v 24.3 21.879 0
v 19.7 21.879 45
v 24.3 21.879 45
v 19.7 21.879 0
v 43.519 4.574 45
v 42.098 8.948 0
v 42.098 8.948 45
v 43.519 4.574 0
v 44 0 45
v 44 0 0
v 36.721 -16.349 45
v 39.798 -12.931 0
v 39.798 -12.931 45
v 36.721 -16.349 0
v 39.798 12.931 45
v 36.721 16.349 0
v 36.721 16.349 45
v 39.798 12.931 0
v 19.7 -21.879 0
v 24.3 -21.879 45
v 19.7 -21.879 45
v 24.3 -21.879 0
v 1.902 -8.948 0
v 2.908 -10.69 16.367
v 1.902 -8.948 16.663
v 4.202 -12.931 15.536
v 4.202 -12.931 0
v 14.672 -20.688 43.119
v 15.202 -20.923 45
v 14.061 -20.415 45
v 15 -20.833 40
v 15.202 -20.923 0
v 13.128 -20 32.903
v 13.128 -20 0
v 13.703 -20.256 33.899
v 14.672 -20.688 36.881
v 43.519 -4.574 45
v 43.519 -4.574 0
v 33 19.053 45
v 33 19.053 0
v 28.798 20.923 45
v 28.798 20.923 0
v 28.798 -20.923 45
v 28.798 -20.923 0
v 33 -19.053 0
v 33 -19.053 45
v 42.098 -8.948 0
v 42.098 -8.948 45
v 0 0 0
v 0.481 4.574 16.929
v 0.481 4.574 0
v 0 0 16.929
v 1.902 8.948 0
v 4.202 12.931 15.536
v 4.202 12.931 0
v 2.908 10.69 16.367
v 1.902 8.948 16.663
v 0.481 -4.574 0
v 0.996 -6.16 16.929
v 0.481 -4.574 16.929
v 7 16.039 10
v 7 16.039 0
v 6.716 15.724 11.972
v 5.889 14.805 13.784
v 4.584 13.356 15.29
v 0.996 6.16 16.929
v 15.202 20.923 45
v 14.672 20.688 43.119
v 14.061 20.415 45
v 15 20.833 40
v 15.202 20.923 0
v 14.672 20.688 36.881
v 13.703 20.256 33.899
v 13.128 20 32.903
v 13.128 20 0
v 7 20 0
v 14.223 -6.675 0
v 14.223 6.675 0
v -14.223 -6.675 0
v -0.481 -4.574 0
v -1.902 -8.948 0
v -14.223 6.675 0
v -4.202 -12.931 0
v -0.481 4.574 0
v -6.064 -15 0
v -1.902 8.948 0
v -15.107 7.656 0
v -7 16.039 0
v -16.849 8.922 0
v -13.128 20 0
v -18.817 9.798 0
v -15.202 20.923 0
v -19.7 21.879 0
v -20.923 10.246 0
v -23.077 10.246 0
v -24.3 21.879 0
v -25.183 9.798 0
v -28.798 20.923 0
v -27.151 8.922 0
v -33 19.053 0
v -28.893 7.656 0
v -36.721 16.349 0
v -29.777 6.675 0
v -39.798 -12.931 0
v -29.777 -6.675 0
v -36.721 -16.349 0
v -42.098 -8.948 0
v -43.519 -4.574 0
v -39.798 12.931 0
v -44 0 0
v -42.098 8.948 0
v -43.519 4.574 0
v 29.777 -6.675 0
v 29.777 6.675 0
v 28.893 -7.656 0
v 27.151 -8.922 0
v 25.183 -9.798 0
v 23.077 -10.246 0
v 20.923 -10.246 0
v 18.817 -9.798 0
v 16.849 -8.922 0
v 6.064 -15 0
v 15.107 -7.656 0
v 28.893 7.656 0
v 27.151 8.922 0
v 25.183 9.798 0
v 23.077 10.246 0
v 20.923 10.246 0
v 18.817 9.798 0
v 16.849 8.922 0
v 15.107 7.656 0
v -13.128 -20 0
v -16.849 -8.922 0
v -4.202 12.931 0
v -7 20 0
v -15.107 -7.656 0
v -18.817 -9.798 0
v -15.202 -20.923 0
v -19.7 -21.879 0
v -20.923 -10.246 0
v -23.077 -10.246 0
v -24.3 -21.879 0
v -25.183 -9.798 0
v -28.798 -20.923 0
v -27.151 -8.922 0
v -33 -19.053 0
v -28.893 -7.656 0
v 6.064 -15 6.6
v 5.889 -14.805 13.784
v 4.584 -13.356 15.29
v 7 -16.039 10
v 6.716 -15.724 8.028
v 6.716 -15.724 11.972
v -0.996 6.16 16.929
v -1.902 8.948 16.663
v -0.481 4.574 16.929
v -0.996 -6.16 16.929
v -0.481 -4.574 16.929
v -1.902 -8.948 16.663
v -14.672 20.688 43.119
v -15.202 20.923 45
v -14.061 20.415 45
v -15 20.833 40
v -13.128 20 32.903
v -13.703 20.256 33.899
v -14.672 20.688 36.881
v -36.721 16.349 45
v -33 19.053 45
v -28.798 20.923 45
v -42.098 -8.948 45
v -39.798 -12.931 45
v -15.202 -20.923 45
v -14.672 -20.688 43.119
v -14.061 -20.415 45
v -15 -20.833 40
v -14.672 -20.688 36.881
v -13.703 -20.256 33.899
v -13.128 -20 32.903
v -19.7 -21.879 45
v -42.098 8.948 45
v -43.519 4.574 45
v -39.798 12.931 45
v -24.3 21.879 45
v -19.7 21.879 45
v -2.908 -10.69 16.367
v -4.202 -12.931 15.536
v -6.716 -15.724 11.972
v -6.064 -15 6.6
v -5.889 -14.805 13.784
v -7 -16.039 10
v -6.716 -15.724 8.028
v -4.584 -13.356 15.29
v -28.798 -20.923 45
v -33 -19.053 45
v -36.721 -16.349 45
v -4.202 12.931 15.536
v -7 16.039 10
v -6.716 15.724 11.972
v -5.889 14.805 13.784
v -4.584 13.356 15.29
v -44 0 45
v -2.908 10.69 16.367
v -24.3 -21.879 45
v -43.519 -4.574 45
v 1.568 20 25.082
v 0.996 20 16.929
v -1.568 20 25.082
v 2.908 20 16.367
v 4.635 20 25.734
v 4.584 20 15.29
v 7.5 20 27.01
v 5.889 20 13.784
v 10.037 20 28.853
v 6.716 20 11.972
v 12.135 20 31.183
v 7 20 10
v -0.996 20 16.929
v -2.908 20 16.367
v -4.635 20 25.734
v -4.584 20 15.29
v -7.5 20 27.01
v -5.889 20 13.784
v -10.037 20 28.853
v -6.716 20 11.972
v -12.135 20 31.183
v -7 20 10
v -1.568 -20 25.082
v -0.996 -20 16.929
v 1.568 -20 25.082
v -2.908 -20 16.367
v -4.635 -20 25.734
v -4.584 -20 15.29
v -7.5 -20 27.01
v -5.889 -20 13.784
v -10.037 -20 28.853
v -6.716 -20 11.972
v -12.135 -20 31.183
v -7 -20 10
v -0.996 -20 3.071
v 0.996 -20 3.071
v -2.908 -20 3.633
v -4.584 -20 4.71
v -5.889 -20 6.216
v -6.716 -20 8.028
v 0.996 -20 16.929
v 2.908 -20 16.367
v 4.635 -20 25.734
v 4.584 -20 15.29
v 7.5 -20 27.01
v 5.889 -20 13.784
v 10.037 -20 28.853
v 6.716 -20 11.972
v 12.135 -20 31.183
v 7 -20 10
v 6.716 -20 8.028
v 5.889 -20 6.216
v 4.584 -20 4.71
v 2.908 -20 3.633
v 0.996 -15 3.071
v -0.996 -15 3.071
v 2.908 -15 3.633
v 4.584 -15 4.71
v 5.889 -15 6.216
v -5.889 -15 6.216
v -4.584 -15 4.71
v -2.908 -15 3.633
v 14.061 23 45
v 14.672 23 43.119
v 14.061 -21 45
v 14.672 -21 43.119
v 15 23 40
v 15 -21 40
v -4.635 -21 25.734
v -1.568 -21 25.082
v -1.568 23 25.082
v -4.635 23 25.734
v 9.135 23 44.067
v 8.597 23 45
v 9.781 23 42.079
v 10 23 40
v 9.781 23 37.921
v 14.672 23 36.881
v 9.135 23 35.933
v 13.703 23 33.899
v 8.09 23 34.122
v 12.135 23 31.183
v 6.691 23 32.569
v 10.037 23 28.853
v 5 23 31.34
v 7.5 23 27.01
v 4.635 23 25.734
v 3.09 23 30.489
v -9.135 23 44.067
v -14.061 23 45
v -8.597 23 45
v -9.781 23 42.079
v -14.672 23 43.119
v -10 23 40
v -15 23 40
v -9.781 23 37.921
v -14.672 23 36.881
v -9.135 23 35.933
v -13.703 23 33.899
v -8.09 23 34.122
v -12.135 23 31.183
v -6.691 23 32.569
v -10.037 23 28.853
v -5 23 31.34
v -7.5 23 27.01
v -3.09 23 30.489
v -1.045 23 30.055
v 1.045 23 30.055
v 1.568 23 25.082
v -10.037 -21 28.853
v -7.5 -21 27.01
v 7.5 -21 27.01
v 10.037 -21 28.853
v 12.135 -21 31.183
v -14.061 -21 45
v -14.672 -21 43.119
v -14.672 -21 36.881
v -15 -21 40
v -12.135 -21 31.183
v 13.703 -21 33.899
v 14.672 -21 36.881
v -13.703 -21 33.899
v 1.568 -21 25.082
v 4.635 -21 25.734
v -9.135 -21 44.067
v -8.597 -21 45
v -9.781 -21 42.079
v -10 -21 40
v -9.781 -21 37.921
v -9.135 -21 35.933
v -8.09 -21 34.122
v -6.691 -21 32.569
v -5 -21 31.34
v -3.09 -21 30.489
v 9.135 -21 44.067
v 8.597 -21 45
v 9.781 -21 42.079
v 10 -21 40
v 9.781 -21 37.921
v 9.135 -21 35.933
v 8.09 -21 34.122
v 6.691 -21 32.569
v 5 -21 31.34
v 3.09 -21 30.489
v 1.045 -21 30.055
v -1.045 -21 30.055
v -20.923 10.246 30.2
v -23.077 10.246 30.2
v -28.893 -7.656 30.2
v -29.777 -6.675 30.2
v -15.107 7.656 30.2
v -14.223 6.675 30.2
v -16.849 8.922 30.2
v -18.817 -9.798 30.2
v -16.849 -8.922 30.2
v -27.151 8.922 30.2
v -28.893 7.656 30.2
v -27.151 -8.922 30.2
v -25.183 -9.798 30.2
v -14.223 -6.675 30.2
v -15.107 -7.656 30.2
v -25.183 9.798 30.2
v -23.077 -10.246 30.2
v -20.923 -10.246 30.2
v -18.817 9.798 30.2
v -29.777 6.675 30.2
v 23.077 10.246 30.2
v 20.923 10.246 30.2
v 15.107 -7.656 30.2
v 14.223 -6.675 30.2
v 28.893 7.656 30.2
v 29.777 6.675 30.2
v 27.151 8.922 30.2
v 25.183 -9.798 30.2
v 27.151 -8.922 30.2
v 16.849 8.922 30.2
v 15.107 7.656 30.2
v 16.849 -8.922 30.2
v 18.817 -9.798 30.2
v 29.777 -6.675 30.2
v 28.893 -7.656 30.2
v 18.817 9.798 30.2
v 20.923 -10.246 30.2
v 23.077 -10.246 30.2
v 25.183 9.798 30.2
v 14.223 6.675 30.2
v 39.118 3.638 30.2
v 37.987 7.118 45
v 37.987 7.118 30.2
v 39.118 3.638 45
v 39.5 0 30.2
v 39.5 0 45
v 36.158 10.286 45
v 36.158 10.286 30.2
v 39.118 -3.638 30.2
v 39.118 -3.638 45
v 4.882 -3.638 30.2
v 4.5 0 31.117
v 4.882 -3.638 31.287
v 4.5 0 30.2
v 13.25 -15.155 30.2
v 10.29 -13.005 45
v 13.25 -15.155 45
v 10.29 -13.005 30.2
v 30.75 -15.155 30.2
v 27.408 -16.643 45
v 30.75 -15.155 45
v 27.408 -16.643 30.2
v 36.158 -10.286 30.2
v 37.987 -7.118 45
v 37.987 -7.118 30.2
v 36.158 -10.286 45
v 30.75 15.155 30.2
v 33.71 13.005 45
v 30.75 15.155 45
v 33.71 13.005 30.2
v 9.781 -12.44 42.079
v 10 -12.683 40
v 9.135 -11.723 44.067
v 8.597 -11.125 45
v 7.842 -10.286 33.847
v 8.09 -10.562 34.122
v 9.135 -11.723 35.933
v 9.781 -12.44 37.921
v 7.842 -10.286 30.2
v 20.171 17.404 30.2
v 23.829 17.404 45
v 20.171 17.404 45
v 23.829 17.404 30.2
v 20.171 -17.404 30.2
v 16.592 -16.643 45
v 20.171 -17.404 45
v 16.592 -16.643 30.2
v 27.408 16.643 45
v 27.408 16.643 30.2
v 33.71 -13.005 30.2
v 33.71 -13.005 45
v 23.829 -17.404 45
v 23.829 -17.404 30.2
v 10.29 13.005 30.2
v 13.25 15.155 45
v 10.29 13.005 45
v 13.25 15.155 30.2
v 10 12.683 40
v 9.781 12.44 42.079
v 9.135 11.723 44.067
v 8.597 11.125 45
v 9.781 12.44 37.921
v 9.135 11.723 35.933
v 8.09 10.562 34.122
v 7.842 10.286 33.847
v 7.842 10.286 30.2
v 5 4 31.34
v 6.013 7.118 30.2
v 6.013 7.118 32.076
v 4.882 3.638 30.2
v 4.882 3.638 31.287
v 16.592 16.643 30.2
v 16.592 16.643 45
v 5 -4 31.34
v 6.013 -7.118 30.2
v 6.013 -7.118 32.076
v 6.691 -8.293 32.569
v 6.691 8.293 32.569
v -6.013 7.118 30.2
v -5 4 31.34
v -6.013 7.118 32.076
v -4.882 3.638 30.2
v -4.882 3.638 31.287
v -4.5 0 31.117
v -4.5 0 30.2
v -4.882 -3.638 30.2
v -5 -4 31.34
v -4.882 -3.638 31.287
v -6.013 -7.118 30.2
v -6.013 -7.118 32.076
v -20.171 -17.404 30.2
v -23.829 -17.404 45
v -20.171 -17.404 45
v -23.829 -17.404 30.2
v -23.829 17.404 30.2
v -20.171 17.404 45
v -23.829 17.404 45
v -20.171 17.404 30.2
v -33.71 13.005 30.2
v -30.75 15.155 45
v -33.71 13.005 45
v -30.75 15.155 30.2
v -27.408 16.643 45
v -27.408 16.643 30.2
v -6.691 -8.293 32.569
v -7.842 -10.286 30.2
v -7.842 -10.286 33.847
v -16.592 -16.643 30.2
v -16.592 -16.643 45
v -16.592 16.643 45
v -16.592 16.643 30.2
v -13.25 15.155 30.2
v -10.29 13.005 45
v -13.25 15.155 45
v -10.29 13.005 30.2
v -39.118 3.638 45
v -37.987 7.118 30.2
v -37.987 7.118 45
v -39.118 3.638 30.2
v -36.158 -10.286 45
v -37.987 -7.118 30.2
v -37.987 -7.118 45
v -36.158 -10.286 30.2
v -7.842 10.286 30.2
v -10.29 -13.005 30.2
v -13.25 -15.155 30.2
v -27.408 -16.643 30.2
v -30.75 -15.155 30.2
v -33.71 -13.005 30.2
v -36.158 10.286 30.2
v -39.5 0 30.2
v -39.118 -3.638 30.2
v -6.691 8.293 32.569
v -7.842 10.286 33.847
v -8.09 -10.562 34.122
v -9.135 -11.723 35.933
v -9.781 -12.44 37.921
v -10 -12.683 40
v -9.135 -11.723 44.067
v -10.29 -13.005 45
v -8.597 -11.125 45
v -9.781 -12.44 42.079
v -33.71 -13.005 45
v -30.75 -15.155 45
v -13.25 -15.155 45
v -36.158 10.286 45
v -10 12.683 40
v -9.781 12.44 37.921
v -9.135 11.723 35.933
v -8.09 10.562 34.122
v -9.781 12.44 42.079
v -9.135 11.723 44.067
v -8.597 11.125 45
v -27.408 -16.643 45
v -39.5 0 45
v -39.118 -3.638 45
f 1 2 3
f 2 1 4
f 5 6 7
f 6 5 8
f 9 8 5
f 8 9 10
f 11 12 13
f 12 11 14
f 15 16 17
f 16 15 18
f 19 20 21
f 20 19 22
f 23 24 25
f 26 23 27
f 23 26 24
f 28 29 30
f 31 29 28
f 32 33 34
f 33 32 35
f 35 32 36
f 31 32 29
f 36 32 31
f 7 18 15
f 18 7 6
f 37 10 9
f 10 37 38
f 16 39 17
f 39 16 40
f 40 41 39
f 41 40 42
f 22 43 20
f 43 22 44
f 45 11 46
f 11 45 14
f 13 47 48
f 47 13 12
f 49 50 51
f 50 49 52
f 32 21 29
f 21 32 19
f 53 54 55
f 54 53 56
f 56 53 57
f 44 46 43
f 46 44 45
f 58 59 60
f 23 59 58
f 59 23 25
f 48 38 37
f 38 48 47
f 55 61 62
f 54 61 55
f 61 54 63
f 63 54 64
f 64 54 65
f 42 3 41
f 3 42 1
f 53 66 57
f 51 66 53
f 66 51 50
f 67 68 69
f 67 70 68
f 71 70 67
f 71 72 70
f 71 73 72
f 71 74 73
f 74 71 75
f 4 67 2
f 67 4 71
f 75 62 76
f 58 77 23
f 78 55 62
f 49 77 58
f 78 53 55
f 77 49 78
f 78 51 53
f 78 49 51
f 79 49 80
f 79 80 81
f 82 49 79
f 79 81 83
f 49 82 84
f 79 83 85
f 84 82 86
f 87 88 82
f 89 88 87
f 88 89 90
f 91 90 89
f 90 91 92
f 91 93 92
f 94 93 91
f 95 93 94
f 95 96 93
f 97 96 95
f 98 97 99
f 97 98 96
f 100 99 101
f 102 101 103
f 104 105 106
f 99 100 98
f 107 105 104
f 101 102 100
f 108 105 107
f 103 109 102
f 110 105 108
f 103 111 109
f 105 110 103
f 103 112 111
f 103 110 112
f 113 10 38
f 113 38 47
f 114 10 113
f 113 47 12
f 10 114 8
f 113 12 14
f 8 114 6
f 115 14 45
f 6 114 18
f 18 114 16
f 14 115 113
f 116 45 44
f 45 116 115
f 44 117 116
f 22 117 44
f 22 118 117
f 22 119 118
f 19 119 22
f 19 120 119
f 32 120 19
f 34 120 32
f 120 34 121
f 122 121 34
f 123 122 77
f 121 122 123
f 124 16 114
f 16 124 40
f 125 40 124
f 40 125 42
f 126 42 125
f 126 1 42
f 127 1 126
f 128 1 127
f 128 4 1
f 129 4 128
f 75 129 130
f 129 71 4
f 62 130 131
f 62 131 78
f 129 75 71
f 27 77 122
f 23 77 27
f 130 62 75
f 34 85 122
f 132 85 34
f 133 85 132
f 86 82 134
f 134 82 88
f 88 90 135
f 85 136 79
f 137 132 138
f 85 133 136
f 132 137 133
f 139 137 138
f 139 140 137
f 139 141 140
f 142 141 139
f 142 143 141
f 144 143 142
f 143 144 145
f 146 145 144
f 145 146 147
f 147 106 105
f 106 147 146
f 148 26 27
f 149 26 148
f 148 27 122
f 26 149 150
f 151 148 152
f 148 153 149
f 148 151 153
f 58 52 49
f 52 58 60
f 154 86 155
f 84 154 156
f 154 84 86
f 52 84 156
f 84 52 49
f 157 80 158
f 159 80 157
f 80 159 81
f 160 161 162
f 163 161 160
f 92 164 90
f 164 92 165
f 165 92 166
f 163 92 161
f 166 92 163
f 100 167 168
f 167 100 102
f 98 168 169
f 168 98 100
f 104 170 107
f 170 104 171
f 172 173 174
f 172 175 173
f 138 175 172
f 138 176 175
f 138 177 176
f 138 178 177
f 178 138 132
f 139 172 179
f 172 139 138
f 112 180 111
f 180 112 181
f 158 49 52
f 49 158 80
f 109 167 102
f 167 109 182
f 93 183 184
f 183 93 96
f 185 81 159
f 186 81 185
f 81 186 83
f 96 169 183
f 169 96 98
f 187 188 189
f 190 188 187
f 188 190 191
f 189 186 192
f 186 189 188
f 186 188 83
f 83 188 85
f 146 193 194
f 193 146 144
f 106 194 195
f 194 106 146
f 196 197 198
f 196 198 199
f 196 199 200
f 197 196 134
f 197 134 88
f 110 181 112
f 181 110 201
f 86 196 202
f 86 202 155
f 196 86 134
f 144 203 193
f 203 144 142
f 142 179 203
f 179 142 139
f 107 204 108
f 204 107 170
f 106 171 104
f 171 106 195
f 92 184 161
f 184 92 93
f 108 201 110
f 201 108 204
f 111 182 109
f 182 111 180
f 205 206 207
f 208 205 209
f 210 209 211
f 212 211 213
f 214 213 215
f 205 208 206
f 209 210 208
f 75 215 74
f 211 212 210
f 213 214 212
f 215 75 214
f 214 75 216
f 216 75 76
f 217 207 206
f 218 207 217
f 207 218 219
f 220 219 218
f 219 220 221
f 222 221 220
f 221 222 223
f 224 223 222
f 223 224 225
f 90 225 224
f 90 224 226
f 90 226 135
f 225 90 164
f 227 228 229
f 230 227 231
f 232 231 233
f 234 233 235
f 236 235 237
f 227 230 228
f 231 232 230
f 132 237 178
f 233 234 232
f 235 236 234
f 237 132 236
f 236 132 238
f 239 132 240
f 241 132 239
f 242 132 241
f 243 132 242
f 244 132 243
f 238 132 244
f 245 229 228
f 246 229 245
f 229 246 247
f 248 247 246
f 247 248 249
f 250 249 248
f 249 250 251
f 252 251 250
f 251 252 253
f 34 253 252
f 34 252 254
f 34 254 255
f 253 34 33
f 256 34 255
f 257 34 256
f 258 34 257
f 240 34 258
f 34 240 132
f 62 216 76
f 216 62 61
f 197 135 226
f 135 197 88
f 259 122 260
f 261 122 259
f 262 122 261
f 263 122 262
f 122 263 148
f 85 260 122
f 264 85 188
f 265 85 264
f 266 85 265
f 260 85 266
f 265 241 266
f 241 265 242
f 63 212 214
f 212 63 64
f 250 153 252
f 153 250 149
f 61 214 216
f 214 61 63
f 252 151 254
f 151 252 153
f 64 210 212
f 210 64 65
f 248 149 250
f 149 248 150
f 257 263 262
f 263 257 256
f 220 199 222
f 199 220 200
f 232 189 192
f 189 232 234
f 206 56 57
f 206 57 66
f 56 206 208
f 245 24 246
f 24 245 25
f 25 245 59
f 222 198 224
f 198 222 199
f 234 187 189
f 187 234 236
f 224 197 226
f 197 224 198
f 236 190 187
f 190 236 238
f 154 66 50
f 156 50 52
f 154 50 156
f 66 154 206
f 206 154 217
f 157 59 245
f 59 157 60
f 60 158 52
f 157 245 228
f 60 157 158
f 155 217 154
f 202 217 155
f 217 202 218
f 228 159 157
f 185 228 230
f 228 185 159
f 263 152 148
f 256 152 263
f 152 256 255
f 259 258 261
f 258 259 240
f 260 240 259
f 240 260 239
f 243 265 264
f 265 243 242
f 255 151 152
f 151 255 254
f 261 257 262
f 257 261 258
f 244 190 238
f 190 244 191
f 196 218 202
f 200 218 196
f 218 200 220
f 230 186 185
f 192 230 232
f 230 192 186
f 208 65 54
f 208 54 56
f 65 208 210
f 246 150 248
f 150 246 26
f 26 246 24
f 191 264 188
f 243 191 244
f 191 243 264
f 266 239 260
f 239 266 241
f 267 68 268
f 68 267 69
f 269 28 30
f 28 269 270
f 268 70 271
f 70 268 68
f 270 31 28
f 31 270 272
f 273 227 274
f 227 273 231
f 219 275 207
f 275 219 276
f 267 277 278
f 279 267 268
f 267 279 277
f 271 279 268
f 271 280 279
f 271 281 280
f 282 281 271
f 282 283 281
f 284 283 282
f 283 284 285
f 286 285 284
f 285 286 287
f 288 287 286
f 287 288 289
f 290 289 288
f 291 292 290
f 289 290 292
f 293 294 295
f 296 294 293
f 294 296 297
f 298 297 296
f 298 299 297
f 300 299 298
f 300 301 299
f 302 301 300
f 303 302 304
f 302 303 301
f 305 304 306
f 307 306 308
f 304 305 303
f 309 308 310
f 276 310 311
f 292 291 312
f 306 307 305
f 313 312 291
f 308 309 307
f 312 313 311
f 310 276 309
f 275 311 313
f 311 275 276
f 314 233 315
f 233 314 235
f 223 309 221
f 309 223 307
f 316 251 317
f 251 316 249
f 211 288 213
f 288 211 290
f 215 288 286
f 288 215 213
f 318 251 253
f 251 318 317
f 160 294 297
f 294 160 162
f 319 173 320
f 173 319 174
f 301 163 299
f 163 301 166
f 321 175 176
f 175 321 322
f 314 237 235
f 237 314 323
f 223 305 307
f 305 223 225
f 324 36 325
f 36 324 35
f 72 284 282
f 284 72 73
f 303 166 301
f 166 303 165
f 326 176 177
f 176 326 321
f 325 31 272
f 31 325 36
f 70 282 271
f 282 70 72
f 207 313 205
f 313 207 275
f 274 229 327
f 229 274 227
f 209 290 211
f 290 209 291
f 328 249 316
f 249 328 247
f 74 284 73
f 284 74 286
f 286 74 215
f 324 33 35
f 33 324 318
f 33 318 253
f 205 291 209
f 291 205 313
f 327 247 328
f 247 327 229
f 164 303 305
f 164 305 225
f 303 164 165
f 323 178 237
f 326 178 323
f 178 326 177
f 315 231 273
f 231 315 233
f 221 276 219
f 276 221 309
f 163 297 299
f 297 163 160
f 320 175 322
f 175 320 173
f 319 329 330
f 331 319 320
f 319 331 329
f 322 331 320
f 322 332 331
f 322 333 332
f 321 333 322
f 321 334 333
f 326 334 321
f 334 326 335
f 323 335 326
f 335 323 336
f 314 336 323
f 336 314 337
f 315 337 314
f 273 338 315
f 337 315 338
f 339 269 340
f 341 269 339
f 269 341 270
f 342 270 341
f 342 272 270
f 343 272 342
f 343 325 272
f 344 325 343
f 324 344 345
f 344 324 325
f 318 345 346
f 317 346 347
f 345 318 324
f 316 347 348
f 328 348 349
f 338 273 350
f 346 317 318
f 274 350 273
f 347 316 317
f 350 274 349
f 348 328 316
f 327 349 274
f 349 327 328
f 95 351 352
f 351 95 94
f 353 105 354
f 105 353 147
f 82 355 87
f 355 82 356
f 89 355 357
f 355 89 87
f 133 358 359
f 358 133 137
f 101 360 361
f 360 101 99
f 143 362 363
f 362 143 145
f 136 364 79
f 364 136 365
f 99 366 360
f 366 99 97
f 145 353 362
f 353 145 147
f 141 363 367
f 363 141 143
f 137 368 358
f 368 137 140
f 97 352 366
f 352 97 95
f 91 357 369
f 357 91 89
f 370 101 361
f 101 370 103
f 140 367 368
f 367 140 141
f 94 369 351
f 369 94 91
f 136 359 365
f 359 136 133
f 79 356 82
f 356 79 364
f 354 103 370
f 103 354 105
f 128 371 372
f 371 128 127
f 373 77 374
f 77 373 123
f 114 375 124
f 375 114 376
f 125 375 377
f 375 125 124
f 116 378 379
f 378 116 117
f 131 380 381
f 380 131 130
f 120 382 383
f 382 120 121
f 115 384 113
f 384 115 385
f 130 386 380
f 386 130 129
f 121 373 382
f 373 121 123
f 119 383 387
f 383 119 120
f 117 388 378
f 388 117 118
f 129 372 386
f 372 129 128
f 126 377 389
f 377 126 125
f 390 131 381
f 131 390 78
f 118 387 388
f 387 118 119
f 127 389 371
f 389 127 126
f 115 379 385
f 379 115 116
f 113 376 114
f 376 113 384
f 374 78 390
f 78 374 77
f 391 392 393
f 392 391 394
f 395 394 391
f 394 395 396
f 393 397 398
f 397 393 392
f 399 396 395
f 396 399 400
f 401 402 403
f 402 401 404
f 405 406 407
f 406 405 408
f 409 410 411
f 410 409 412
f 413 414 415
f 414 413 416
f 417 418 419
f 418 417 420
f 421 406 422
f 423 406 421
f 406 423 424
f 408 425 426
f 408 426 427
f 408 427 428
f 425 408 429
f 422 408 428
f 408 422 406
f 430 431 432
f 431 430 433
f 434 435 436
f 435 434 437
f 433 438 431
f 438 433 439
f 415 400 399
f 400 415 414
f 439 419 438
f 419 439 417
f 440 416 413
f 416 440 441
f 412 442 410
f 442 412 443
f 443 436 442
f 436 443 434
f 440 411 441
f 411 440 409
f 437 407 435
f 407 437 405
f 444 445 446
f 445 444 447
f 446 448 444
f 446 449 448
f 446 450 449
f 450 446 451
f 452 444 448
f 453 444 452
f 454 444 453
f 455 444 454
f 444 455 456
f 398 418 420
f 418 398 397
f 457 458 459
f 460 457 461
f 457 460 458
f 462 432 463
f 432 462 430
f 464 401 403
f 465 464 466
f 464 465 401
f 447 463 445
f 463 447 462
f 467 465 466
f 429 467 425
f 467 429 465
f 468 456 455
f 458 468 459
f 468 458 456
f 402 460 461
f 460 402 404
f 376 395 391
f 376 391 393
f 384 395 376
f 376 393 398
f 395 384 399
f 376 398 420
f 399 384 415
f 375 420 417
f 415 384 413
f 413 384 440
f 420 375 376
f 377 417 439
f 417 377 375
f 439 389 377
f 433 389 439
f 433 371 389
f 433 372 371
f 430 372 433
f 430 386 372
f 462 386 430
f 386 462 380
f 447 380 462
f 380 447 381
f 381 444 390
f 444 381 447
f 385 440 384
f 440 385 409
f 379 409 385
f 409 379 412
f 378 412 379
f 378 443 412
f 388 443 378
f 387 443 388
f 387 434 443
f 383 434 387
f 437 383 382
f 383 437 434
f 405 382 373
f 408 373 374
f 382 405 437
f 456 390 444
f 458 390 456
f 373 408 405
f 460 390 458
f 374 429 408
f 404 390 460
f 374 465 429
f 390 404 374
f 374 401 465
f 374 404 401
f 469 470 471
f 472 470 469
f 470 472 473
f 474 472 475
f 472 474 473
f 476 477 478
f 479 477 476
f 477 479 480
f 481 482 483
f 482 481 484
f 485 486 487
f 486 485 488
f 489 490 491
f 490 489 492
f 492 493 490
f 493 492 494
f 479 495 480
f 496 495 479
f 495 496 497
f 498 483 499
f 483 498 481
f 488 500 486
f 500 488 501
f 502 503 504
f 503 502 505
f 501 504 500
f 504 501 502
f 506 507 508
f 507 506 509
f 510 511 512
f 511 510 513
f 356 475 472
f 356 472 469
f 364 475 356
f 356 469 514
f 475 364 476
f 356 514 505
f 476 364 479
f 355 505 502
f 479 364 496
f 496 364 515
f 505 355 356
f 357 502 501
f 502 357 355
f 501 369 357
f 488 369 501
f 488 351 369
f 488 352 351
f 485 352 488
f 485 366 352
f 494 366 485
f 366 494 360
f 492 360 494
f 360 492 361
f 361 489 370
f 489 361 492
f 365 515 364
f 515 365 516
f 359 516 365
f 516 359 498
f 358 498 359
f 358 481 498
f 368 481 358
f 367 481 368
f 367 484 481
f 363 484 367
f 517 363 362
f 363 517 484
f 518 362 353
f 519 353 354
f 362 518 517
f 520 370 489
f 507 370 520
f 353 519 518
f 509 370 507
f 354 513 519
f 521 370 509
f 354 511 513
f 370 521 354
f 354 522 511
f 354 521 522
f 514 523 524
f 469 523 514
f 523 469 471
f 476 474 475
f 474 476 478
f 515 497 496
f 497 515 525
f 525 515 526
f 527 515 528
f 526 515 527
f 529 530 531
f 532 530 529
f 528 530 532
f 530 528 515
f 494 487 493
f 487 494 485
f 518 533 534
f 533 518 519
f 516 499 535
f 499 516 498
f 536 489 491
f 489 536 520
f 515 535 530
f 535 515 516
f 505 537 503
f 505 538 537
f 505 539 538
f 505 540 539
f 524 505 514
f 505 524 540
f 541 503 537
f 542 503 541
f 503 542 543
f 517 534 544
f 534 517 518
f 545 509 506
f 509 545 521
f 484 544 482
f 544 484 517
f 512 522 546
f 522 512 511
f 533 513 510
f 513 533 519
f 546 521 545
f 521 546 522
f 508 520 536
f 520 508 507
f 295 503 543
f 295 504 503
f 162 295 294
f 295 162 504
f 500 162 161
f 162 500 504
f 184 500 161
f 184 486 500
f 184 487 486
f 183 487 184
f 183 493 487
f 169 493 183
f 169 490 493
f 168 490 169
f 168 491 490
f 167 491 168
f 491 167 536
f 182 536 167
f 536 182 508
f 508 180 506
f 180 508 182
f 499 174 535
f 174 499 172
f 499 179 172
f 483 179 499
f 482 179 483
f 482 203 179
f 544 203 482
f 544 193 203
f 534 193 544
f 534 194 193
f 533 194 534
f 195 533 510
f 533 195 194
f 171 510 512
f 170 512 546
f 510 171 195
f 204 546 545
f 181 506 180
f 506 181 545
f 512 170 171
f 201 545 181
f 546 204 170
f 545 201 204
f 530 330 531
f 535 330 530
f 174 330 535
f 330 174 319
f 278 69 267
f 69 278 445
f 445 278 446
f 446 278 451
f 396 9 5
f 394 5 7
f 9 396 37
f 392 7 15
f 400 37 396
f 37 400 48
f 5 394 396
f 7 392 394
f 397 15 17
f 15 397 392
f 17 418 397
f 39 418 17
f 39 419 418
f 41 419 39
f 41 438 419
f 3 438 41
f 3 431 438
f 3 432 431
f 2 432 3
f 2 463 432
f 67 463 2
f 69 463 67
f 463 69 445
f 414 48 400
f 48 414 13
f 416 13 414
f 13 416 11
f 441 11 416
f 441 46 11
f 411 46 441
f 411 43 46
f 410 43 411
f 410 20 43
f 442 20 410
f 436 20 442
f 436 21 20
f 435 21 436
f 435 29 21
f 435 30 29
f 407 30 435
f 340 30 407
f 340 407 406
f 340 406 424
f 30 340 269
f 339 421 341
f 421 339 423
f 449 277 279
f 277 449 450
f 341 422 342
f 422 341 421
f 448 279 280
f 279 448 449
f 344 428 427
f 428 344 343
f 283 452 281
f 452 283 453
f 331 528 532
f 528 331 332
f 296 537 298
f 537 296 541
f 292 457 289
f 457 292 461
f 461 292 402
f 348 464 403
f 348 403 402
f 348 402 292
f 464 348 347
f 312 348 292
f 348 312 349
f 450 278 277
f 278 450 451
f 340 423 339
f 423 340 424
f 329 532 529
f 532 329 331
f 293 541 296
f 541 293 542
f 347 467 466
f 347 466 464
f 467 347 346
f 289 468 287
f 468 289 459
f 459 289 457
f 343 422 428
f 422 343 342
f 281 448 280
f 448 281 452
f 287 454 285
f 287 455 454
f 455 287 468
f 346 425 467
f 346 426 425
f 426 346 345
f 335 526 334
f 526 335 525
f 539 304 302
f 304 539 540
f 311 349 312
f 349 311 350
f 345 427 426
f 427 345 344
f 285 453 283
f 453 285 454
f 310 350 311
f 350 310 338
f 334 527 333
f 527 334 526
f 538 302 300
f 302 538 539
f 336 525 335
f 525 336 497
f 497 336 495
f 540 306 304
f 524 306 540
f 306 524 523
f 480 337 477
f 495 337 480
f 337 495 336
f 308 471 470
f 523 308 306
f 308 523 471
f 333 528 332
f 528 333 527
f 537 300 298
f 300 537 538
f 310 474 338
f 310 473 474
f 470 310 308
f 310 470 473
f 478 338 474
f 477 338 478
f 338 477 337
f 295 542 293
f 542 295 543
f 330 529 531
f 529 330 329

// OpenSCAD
module 180Motor()
{
	//Code for 180 motor - scale for cut outs and insertions

	difference()
	{
		union()
		{	
			cylinder(r = 20.4 / 2, h = 34.2);		
		}

		translate([15.4 / 2, -20, 0])
		{
			cube([10, 40, 34.2]);
		}

		translate([-15.4 / 2 - 10 , -20, 0])
		{
			cube([10, 40, 34.2]);
		}
	}
}

module MotorFlywheelHousing()
{

			translate([44 / 2, 0, 0])
			{
				rotate([0, 0, 0])
				{
					cylinder(r = 44 / 2, h = 50);
				}
			}

			translate([- 44 / 2, 0, 0])
			{
				rotate([0, 0, 0])
				{
					cylinder(r = 44 / 2, h = 50);
				}
			}

}

module 180MotorHousings()
{

		//Motor Housing 1
		translate([-22, 0, 0])
		{
			scale([1.01, 1.01, 1])
			{
				180Motor();
			}
		}
	
		//Motor Housing 2
		translate([22, 0, 0])
		{
			scale([1.01, 1.01, 1])
			{
				180Motor();
			}
		}

}


module FlywheelCutOuts()
{

		//Flywheel Spacing 1
		translate([22, 0, 34.2 - 4])
		{
			cylinder(r = 35 /2, h = 100);
		}

		//Flywheel Spacing 2
		translate([-22, 0, 34.2 - 4])
		{
			cylinder(r = 35 /2, h = 100);
		}
}

module LowerInterface()
{
	//Interface between forward upper and lower blaster receiver

	difference()
	{
		union()
		{
			translate([-22, -20, 0])
			{
				cube([44, 40, 34.2]);
			}
		}

		translate([-7, -15, 0])
		{
			cube([14, 45, 10]);
		}

		translate([0, 20, 10])
		{
			rotate([90, 0, 0])
			{
				cylinder(r = 7, h = 45);
			}
		}

	}
}

module CompleteForwardUpper()
{
	difference()
	{
		union()
		{
			MotorFlywheelHousing();
			LowerInterface();
	
			translate([0, 23, 40])
			{
				rotate([90, 0, 0])
				{
					cylinder(r = 15, h = 44);
				}
			}

		}

		180MotorHousings();
		FlywheelCutOuts();

		//Super Block - Top cut off
		translate([-50, -50, 45])
		{
			cube([100, 100, 20]);
		}

		translate([0, 50, 40])
		{
			rotate([90, 0, 0])
			{
				cylinder(r = 10, h = 500);
			}
		}
/*
		translate([-7, -20, 0])
		{
			cube([14, 45, 10]);
		}

		translate([0, 25, 10])
		{
			rotate([90, 0, 0])
			{
				cylinder(r = 7, h = 45);
			}
		}
*/
	}
}

CompleteForwardUpper();
